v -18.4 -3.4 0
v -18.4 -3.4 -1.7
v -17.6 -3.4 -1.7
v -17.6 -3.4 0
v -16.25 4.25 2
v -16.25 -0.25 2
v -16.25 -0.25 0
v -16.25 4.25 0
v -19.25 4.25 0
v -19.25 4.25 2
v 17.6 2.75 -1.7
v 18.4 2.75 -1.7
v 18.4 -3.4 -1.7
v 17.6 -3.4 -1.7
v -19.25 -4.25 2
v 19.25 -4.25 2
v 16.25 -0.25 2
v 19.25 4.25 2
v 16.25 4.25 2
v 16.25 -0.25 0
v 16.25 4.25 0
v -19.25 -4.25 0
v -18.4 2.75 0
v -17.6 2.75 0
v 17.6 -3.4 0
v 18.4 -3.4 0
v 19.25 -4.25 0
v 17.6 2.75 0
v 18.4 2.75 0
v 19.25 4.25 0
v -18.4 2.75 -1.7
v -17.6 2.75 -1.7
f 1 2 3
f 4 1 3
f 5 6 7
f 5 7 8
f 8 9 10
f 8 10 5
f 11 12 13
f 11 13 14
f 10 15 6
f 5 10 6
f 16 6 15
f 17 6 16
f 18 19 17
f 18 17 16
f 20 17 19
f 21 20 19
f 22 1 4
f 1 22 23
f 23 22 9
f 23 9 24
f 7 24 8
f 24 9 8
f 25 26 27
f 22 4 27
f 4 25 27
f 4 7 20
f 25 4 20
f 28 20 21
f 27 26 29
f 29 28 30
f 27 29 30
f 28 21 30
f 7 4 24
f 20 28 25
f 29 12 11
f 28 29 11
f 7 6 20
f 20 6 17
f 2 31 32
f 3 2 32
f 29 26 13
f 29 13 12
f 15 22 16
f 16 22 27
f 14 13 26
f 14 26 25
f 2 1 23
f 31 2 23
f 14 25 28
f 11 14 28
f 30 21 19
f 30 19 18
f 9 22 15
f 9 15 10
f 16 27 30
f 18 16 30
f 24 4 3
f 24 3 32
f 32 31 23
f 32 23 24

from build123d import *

# Parameters (mm, degrees)
SKETCH1_W           = 38.5
SKETCH1_H           = 8.5
BOSS_EXTRUDE1_DEPTH = 2
SKETCH2_W           = 0.8
SKETCH2_H           = 6.15
BOSS_EXTRUDE2_DEPTH = 1.7
SKETCH3_W           = 32.5
SKETCH3_H           = 4.5
CUT_EXTRUDE1_DEPTH  = 21.057791504


with BuildPart() as part:
    # Sketch1 → Boss-Extrude1 (new body)
    with BuildSketch(Plane.XY):
        Rectangle(SKETCH1_W, SKETCH1_H)
    extrude(amount=BOSS_EXTRUDE1_DEPTH)

    # Sketch2 → Boss-Extrude2 (add)
    with BuildSketch(Plane(origin=(0, 0, 0), x_dir=(-1, 0, 0), z_dir=(0, 0, -1))):
        with Locations((-18, -0.325)):
            Rectangle(SKETCH2_W, SKETCH2_H)
    boss_extrude2 = extrude(amount=BOSS_EXTRUDE2_DEPTH)

    # Mirror1: Boss-Extrude2 across plane
    add(boss_extrude2.mirror(Plane(origin=(0, 0, 0), x_dir=(0, 0, 1), z_dir=(1, 0, 0))))

    # Sketch3 → Cut-Extrude1 (cut, through all)
    with BuildSketch(Plane.XY.offset(2)):
        with Locations((0, 2)):
            Rectangle(SKETCH3_W, SKETCH3_H)
    extrude(amount=-CUT_EXTRUDE1_DEPTH, mode=Mode.SUBTRACT)


solid = part.part
